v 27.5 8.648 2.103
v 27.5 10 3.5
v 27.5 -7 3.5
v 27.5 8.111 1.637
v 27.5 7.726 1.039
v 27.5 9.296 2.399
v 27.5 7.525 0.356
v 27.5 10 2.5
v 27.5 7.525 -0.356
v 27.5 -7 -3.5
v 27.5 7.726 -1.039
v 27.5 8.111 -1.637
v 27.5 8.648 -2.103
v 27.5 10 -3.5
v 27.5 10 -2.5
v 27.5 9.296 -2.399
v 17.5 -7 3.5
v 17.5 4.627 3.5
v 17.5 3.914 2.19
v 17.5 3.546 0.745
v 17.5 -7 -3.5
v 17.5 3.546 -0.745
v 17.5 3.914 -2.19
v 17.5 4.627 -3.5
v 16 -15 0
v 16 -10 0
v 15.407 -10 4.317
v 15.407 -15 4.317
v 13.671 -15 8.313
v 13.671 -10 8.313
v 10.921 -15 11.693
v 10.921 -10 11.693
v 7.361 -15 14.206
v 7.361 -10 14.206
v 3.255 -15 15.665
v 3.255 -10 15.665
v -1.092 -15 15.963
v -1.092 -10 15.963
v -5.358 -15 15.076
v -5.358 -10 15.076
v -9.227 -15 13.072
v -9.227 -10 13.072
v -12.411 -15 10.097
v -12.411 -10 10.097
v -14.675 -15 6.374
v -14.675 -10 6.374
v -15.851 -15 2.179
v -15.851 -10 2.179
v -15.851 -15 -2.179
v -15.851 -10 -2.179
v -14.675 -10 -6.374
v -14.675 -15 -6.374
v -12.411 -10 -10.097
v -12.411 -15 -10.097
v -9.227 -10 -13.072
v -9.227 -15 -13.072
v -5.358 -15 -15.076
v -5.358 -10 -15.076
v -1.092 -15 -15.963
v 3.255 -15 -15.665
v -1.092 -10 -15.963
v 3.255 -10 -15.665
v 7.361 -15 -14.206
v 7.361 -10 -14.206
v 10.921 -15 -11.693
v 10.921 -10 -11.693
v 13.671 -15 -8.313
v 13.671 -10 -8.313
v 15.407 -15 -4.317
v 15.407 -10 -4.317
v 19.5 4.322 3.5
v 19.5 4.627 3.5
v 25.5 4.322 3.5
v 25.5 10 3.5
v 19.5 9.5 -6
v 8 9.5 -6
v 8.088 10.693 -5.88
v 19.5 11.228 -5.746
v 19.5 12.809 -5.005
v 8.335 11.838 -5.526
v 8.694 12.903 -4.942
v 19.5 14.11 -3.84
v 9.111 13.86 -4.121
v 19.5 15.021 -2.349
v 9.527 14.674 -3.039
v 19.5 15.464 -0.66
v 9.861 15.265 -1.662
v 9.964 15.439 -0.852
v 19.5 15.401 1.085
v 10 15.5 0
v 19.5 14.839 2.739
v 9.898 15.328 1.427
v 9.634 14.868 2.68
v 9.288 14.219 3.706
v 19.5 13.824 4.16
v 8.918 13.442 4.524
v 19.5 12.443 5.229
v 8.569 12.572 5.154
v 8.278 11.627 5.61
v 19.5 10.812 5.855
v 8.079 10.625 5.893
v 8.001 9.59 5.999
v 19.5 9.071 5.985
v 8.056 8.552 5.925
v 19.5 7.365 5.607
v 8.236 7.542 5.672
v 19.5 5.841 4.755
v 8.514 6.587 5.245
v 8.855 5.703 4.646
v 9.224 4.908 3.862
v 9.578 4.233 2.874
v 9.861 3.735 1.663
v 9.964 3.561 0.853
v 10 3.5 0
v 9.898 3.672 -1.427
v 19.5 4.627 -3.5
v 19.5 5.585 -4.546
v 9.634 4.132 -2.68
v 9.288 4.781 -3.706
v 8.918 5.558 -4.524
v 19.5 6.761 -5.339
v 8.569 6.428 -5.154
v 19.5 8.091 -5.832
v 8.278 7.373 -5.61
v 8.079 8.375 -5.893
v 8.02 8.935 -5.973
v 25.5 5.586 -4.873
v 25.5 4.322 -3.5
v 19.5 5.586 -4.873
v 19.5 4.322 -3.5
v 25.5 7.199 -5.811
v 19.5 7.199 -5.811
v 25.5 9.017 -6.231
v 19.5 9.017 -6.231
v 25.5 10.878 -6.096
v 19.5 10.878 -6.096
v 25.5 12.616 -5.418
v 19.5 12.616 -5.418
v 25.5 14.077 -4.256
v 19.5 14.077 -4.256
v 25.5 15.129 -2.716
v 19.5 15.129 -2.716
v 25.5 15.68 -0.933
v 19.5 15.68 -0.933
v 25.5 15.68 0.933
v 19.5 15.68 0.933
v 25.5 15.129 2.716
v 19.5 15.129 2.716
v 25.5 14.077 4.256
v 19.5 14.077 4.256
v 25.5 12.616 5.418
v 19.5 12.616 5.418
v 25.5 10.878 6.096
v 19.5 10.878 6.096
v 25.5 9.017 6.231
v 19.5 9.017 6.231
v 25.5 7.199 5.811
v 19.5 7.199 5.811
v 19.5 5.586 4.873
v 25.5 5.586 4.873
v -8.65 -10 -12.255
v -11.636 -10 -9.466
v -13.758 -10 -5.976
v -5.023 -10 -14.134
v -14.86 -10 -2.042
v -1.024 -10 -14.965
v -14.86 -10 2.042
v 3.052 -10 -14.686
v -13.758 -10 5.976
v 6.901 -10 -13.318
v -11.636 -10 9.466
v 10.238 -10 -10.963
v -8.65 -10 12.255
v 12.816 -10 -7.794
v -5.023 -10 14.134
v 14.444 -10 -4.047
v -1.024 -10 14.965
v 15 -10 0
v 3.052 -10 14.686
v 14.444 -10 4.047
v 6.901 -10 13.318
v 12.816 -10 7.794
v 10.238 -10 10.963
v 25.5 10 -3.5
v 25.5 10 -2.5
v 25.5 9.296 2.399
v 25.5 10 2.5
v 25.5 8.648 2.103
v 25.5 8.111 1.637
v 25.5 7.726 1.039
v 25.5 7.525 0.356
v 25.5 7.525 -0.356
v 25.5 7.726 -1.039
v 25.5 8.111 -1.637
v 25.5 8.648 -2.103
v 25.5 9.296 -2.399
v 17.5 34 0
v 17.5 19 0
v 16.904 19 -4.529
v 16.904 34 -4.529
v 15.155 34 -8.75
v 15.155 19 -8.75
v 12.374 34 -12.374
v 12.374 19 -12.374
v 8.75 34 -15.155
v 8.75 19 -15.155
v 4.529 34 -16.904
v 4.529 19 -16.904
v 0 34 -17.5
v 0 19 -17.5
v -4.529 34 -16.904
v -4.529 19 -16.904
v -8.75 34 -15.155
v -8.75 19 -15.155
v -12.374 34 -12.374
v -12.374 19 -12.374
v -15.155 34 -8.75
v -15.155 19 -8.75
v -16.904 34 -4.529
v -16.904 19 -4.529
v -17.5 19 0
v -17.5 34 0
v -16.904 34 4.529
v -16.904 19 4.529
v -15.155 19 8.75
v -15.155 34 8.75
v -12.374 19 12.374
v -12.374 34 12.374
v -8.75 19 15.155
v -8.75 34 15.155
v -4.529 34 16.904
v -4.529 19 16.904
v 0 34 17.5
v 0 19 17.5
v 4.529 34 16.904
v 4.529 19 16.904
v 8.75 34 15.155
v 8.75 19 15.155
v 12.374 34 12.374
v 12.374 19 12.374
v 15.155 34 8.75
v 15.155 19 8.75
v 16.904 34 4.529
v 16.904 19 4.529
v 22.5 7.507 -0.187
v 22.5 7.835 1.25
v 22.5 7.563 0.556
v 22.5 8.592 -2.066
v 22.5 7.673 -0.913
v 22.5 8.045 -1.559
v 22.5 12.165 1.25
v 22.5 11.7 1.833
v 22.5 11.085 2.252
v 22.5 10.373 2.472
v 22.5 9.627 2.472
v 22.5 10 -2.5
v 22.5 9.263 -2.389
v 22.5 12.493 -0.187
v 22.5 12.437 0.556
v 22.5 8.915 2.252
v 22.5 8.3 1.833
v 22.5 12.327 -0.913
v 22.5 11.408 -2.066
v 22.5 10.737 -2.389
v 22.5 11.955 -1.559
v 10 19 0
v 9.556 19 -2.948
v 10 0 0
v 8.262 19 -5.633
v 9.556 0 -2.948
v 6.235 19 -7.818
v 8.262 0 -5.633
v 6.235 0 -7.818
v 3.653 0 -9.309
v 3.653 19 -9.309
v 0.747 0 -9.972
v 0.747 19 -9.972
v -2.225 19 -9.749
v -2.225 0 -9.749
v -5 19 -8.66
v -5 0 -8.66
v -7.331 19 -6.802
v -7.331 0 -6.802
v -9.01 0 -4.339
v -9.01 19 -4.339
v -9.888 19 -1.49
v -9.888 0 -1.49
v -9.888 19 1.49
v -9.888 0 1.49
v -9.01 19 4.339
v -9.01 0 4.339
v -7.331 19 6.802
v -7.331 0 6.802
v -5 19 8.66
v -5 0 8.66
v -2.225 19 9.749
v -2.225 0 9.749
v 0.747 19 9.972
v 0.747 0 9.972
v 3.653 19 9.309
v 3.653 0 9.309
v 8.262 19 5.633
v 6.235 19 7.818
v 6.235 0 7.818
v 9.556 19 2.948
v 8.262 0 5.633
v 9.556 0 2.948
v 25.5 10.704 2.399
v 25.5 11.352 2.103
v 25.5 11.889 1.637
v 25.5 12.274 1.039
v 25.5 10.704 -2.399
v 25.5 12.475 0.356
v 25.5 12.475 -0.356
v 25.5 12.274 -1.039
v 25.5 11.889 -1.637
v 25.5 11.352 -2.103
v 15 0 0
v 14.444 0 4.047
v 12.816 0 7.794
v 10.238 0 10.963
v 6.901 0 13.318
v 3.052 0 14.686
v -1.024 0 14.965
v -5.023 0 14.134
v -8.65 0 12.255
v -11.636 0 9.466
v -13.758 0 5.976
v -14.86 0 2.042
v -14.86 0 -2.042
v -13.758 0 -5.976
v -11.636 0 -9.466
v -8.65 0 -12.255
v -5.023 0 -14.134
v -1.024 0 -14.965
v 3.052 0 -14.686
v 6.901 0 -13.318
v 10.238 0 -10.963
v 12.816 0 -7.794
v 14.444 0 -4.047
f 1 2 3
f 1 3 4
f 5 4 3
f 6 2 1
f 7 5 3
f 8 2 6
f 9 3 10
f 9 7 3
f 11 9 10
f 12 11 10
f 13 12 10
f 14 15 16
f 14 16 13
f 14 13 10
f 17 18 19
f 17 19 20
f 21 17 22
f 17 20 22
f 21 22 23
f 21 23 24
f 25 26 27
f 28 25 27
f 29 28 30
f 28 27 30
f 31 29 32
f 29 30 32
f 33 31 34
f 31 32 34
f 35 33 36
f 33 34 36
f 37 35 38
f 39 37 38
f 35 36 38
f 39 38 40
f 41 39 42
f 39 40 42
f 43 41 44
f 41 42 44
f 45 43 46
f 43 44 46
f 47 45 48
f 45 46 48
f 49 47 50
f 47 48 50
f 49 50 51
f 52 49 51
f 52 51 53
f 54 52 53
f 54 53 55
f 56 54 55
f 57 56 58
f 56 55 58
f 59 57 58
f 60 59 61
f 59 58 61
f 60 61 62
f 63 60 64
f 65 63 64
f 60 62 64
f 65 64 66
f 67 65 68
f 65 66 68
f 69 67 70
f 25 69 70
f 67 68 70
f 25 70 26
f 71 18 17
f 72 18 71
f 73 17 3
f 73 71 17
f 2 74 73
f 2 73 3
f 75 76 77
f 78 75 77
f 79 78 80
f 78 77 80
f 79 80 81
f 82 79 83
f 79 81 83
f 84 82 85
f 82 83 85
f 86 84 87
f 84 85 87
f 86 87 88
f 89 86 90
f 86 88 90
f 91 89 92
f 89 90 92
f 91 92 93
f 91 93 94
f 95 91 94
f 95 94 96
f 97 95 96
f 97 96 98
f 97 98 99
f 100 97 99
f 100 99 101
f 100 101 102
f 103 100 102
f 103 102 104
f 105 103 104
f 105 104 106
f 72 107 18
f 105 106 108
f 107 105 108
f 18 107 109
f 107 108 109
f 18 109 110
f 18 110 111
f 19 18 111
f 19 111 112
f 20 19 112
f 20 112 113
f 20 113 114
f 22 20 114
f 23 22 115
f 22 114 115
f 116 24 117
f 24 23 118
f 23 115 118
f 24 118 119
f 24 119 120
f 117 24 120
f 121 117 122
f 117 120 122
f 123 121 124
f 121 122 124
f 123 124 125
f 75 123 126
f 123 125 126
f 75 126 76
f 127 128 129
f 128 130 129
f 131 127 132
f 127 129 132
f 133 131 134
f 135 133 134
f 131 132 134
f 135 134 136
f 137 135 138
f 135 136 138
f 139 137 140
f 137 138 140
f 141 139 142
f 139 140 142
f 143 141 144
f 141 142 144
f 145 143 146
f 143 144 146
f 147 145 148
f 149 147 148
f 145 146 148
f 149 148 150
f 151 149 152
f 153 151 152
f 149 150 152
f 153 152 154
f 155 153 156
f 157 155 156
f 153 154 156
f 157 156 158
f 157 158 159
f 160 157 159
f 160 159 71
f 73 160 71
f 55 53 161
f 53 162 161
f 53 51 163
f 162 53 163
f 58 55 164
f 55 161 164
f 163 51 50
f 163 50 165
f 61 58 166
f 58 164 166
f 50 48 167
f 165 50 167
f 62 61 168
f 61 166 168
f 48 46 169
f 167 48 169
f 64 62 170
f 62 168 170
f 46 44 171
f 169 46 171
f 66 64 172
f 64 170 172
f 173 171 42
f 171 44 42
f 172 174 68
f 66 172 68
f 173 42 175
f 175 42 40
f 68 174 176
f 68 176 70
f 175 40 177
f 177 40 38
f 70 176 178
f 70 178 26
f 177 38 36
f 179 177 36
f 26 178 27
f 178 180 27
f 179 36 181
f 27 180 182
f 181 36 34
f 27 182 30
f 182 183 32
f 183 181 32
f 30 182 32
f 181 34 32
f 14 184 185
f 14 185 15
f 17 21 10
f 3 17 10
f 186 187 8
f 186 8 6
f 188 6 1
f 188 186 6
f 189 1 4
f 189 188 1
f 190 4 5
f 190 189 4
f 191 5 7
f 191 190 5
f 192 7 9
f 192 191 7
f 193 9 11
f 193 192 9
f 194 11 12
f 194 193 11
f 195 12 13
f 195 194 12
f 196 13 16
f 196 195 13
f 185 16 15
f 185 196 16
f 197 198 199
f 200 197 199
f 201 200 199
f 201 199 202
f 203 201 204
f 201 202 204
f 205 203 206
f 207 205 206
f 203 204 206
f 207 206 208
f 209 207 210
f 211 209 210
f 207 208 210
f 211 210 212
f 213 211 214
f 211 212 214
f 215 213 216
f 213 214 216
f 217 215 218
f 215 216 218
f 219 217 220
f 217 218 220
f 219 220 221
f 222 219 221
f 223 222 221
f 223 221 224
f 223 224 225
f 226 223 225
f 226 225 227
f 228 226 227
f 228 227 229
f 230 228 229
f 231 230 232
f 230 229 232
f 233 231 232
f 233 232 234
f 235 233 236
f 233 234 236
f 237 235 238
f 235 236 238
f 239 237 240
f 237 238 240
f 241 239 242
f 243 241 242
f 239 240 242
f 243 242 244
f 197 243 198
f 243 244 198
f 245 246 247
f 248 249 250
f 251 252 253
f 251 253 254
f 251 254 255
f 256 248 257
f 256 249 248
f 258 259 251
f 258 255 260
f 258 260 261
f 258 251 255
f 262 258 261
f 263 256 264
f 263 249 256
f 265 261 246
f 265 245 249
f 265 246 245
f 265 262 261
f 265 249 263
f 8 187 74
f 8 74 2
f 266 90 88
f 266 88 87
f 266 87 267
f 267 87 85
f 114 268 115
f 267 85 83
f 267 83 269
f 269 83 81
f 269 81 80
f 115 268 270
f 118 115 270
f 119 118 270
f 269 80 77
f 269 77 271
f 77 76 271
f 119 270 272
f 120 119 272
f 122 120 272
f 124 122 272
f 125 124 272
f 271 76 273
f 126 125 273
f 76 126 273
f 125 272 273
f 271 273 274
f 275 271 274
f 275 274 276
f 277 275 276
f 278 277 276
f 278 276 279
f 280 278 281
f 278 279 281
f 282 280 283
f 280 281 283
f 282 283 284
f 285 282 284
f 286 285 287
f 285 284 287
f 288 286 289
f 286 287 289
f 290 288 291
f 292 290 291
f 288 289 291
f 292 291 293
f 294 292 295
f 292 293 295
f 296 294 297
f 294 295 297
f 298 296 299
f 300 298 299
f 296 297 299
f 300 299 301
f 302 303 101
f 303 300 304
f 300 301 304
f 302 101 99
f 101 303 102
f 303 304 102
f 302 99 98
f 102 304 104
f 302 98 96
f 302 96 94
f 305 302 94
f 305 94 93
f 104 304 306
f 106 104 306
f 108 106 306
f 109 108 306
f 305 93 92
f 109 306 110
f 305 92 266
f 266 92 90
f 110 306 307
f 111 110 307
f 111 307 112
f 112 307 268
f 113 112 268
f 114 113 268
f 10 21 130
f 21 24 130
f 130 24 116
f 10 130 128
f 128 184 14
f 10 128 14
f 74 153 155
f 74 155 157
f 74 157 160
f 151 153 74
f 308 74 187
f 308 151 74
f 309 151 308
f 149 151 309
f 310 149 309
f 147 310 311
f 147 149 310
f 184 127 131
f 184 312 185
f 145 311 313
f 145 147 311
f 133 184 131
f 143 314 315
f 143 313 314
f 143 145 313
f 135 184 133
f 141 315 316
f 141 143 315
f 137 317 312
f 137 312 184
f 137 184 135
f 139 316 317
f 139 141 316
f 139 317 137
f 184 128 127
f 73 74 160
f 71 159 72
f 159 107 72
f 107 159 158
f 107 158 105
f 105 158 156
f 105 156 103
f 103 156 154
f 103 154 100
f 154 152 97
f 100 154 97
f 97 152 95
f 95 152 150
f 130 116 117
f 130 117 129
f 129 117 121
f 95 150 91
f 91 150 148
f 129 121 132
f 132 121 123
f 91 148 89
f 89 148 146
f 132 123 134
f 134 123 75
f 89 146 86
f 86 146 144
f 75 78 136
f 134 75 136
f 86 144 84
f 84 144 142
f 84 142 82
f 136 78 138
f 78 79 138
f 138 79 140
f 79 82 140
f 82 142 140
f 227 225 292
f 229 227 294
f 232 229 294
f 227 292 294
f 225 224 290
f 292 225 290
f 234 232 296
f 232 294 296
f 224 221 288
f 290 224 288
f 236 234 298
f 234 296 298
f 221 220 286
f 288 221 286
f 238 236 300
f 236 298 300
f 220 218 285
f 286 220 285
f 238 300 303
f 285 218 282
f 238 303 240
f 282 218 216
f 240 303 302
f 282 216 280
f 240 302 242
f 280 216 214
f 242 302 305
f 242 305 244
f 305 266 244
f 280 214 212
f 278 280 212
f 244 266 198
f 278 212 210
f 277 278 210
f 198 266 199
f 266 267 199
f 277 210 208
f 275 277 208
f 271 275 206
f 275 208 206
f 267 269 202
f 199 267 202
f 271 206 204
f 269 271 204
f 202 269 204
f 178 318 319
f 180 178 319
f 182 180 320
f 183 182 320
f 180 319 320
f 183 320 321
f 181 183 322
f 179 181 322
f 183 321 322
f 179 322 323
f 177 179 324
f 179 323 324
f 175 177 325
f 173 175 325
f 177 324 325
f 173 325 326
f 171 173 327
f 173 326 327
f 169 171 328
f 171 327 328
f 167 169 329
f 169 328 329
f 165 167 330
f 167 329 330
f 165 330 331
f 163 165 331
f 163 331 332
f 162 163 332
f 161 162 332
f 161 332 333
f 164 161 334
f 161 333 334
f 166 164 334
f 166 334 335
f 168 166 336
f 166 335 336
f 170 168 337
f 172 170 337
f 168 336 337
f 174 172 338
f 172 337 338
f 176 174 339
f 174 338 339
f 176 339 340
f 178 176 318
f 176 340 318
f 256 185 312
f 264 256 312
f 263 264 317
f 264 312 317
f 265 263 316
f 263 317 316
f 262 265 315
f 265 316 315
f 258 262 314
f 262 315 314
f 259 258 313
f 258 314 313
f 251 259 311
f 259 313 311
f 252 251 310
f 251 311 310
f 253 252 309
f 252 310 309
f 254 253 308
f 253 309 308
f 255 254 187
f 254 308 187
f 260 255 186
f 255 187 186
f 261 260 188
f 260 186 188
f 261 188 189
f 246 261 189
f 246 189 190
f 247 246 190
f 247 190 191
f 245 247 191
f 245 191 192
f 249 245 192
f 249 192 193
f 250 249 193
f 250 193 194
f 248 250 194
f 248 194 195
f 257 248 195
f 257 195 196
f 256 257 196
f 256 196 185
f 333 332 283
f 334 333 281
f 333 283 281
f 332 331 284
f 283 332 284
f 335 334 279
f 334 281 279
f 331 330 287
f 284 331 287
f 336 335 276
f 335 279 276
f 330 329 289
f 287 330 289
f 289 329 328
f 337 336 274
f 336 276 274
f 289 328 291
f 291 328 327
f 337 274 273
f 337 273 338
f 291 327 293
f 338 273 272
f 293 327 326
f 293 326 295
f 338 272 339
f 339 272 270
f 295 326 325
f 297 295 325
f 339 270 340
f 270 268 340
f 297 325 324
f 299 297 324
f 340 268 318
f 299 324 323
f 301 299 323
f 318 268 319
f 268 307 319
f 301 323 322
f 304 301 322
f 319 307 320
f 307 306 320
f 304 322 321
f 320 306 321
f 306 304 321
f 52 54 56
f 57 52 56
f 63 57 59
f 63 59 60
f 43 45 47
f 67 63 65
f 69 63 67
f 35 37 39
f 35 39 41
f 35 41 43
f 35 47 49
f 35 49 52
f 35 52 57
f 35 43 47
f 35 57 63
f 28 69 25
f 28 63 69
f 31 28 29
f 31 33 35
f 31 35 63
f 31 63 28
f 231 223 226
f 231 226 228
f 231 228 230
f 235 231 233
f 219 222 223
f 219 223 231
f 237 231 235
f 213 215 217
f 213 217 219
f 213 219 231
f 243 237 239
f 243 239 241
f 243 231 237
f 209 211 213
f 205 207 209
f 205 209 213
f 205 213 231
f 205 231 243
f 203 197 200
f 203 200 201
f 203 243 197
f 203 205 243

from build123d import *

# Parameters (mm, degrees)
SKETCH1_R                      = 10
BOSS_EXTRUDE1_DEPTH            = 19
SKETCH2_R                      = 6
BOSS_EXTRUDE2_DEPTH            = 19.5
SKETCH7_R                      = 15
BOSS_EXTRUDE9_DEPTH            = 10
SKETCH9_R                      = 16
BOSS_EXTRUDE10_DEPTH           = 5
SKETCH10_R                     = 17.5
BOSS_EXTRUDE11_DEPTH           = 15
SKETCH11_R                     = 6.25
BOSS_EXTRUDE12_DEPTH           = 6
SKETCH12_W                     = 10
SKETCH12_H                     = 7
BOSS_EXTRUDE13_DEPTH           = 10
BOSS_EXTRUDE13_DEPTH_BACK      = 7
SKETCH13_R                     = 2.5
CUT_EXTRUDE1_DEPTH             = 3
CUT_EXTRUDE1_DIRECTION_2_REACH = 4


with BuildPart() as part:
    # Sketch1 → Boss-Extrude1 (new body)
    with BuildSketch(Plane(origin=(0, 0, 0), x_dir=(1, 0, 0), z_dir=(0, 1, 0))):
        Circle(SKETCH1_R)
    extrude(amount=BOSS_EXTRUDE1_DEPTH)

    # Sketch2 → Boss-Extrude2 (add)
    with BuildSketch(Plane(origin=(0, 0, 0), x_dir=(0, 0, -1), z_dir=(1, 0, 0))):
        with Locations((0, 9.5)):
            Circle(SKETCH2_R)
    extrude(amount=BOSS_EXTRUDE2_DEPTH)

    # Sketch7 → Boss-Extrude9 (add)
    with BuildSketch(Plane.XZ):
        Circle(SKETCH7_R)
    extrude(amount=BOSS_EXTRUDE9_DEPTH)

    # Sketch9 → Boss-Extrude10 (add)
    with BuildSketch(Plane.XZ.offset(10)):
        Circle(SKETCH9_R)
    extrude(amount=BOSS_EXTRUDE10_DEPTH)

    # Sketch10 → Boss-Extrude11 (add)
    with BuildSketch(Plane(origin=(0, 19, 0), x_dir=(1, 0, 0), z_dir=(0, 1, 0))):
        Circle(SKETCH10_R)
    extrude(amount=BOSS_EXTRUDE11_DEPTH)

    # Sketch11 → Boss-Extrude12 (add)
    with BuildSketch(Plane(origin=(19.5, 0, 0), x_dir=(0, 0, -1), z_dir=(1, 0, 0))):
        with Locations((0, 9.5)):
            Circle(SKETCH11_R)
    extrude(amount=BOSS_EXTRUDE12_DEPTH)

    # Sketch12 → Boss-Extrude13 (add, two sides)
    with BuildSketch(Plane(origin=(0, 0, 0), x_dir=(1, 0, 0), z_dir=(0, 1, 0))) as boss_extrude13_sk:
        with Locations((22.5, 0)):
            Rectangle(SKETCH12_W, SKETCH12_H)
    extrude(amount=BOSS_EXTRUDE13_DEPTH)
    extrude(boss_extrude13_sk.sketch, amount=-BOSS_EXTRUDE13_DEPTH_BACK)

    # Sketch13 → Cut-Extrude1 (cut)
    with BuildSketch(Plane(origin=(25.5, 0, 0), x_dir=(0, 0, -1), z_dir=(1, 0, 0))):
        with Locations((0, 10)):
            Circle(SKETCH13_R)
    extrude(amount=-CUT_EXTRUDE1_DEPTH, mode=Mode.SUBTRACT)

    # Sketch13 → Cut-Extrude1 direction 2 (cut, up to next)
    with BuildSketch(Plane(origin=(25.5, 0, 0), x_dir=(0, 0, -1), z_dir=(1, 0, 0)), mode=Mode.PRIVATE) as cut_extrude1_direction_2_sk1:
        with Locations((0, 10)):
            Circle(SKETCH13_R)
    cut_extrude1_direction_2_tool1 = extrude(cut_extrude1_direction_2_sk1.sketch, amount=CUT_EXTRUDE1_DIRECTION_2_REACH, mode=Mode.PRIVATE) & part.part
    add(cut_extrude1_direction_2_tool1.solids().sort_by_distance((25.5, 10, 0))[0], mode=Mode.SUBTRACT)


solid = part.part
